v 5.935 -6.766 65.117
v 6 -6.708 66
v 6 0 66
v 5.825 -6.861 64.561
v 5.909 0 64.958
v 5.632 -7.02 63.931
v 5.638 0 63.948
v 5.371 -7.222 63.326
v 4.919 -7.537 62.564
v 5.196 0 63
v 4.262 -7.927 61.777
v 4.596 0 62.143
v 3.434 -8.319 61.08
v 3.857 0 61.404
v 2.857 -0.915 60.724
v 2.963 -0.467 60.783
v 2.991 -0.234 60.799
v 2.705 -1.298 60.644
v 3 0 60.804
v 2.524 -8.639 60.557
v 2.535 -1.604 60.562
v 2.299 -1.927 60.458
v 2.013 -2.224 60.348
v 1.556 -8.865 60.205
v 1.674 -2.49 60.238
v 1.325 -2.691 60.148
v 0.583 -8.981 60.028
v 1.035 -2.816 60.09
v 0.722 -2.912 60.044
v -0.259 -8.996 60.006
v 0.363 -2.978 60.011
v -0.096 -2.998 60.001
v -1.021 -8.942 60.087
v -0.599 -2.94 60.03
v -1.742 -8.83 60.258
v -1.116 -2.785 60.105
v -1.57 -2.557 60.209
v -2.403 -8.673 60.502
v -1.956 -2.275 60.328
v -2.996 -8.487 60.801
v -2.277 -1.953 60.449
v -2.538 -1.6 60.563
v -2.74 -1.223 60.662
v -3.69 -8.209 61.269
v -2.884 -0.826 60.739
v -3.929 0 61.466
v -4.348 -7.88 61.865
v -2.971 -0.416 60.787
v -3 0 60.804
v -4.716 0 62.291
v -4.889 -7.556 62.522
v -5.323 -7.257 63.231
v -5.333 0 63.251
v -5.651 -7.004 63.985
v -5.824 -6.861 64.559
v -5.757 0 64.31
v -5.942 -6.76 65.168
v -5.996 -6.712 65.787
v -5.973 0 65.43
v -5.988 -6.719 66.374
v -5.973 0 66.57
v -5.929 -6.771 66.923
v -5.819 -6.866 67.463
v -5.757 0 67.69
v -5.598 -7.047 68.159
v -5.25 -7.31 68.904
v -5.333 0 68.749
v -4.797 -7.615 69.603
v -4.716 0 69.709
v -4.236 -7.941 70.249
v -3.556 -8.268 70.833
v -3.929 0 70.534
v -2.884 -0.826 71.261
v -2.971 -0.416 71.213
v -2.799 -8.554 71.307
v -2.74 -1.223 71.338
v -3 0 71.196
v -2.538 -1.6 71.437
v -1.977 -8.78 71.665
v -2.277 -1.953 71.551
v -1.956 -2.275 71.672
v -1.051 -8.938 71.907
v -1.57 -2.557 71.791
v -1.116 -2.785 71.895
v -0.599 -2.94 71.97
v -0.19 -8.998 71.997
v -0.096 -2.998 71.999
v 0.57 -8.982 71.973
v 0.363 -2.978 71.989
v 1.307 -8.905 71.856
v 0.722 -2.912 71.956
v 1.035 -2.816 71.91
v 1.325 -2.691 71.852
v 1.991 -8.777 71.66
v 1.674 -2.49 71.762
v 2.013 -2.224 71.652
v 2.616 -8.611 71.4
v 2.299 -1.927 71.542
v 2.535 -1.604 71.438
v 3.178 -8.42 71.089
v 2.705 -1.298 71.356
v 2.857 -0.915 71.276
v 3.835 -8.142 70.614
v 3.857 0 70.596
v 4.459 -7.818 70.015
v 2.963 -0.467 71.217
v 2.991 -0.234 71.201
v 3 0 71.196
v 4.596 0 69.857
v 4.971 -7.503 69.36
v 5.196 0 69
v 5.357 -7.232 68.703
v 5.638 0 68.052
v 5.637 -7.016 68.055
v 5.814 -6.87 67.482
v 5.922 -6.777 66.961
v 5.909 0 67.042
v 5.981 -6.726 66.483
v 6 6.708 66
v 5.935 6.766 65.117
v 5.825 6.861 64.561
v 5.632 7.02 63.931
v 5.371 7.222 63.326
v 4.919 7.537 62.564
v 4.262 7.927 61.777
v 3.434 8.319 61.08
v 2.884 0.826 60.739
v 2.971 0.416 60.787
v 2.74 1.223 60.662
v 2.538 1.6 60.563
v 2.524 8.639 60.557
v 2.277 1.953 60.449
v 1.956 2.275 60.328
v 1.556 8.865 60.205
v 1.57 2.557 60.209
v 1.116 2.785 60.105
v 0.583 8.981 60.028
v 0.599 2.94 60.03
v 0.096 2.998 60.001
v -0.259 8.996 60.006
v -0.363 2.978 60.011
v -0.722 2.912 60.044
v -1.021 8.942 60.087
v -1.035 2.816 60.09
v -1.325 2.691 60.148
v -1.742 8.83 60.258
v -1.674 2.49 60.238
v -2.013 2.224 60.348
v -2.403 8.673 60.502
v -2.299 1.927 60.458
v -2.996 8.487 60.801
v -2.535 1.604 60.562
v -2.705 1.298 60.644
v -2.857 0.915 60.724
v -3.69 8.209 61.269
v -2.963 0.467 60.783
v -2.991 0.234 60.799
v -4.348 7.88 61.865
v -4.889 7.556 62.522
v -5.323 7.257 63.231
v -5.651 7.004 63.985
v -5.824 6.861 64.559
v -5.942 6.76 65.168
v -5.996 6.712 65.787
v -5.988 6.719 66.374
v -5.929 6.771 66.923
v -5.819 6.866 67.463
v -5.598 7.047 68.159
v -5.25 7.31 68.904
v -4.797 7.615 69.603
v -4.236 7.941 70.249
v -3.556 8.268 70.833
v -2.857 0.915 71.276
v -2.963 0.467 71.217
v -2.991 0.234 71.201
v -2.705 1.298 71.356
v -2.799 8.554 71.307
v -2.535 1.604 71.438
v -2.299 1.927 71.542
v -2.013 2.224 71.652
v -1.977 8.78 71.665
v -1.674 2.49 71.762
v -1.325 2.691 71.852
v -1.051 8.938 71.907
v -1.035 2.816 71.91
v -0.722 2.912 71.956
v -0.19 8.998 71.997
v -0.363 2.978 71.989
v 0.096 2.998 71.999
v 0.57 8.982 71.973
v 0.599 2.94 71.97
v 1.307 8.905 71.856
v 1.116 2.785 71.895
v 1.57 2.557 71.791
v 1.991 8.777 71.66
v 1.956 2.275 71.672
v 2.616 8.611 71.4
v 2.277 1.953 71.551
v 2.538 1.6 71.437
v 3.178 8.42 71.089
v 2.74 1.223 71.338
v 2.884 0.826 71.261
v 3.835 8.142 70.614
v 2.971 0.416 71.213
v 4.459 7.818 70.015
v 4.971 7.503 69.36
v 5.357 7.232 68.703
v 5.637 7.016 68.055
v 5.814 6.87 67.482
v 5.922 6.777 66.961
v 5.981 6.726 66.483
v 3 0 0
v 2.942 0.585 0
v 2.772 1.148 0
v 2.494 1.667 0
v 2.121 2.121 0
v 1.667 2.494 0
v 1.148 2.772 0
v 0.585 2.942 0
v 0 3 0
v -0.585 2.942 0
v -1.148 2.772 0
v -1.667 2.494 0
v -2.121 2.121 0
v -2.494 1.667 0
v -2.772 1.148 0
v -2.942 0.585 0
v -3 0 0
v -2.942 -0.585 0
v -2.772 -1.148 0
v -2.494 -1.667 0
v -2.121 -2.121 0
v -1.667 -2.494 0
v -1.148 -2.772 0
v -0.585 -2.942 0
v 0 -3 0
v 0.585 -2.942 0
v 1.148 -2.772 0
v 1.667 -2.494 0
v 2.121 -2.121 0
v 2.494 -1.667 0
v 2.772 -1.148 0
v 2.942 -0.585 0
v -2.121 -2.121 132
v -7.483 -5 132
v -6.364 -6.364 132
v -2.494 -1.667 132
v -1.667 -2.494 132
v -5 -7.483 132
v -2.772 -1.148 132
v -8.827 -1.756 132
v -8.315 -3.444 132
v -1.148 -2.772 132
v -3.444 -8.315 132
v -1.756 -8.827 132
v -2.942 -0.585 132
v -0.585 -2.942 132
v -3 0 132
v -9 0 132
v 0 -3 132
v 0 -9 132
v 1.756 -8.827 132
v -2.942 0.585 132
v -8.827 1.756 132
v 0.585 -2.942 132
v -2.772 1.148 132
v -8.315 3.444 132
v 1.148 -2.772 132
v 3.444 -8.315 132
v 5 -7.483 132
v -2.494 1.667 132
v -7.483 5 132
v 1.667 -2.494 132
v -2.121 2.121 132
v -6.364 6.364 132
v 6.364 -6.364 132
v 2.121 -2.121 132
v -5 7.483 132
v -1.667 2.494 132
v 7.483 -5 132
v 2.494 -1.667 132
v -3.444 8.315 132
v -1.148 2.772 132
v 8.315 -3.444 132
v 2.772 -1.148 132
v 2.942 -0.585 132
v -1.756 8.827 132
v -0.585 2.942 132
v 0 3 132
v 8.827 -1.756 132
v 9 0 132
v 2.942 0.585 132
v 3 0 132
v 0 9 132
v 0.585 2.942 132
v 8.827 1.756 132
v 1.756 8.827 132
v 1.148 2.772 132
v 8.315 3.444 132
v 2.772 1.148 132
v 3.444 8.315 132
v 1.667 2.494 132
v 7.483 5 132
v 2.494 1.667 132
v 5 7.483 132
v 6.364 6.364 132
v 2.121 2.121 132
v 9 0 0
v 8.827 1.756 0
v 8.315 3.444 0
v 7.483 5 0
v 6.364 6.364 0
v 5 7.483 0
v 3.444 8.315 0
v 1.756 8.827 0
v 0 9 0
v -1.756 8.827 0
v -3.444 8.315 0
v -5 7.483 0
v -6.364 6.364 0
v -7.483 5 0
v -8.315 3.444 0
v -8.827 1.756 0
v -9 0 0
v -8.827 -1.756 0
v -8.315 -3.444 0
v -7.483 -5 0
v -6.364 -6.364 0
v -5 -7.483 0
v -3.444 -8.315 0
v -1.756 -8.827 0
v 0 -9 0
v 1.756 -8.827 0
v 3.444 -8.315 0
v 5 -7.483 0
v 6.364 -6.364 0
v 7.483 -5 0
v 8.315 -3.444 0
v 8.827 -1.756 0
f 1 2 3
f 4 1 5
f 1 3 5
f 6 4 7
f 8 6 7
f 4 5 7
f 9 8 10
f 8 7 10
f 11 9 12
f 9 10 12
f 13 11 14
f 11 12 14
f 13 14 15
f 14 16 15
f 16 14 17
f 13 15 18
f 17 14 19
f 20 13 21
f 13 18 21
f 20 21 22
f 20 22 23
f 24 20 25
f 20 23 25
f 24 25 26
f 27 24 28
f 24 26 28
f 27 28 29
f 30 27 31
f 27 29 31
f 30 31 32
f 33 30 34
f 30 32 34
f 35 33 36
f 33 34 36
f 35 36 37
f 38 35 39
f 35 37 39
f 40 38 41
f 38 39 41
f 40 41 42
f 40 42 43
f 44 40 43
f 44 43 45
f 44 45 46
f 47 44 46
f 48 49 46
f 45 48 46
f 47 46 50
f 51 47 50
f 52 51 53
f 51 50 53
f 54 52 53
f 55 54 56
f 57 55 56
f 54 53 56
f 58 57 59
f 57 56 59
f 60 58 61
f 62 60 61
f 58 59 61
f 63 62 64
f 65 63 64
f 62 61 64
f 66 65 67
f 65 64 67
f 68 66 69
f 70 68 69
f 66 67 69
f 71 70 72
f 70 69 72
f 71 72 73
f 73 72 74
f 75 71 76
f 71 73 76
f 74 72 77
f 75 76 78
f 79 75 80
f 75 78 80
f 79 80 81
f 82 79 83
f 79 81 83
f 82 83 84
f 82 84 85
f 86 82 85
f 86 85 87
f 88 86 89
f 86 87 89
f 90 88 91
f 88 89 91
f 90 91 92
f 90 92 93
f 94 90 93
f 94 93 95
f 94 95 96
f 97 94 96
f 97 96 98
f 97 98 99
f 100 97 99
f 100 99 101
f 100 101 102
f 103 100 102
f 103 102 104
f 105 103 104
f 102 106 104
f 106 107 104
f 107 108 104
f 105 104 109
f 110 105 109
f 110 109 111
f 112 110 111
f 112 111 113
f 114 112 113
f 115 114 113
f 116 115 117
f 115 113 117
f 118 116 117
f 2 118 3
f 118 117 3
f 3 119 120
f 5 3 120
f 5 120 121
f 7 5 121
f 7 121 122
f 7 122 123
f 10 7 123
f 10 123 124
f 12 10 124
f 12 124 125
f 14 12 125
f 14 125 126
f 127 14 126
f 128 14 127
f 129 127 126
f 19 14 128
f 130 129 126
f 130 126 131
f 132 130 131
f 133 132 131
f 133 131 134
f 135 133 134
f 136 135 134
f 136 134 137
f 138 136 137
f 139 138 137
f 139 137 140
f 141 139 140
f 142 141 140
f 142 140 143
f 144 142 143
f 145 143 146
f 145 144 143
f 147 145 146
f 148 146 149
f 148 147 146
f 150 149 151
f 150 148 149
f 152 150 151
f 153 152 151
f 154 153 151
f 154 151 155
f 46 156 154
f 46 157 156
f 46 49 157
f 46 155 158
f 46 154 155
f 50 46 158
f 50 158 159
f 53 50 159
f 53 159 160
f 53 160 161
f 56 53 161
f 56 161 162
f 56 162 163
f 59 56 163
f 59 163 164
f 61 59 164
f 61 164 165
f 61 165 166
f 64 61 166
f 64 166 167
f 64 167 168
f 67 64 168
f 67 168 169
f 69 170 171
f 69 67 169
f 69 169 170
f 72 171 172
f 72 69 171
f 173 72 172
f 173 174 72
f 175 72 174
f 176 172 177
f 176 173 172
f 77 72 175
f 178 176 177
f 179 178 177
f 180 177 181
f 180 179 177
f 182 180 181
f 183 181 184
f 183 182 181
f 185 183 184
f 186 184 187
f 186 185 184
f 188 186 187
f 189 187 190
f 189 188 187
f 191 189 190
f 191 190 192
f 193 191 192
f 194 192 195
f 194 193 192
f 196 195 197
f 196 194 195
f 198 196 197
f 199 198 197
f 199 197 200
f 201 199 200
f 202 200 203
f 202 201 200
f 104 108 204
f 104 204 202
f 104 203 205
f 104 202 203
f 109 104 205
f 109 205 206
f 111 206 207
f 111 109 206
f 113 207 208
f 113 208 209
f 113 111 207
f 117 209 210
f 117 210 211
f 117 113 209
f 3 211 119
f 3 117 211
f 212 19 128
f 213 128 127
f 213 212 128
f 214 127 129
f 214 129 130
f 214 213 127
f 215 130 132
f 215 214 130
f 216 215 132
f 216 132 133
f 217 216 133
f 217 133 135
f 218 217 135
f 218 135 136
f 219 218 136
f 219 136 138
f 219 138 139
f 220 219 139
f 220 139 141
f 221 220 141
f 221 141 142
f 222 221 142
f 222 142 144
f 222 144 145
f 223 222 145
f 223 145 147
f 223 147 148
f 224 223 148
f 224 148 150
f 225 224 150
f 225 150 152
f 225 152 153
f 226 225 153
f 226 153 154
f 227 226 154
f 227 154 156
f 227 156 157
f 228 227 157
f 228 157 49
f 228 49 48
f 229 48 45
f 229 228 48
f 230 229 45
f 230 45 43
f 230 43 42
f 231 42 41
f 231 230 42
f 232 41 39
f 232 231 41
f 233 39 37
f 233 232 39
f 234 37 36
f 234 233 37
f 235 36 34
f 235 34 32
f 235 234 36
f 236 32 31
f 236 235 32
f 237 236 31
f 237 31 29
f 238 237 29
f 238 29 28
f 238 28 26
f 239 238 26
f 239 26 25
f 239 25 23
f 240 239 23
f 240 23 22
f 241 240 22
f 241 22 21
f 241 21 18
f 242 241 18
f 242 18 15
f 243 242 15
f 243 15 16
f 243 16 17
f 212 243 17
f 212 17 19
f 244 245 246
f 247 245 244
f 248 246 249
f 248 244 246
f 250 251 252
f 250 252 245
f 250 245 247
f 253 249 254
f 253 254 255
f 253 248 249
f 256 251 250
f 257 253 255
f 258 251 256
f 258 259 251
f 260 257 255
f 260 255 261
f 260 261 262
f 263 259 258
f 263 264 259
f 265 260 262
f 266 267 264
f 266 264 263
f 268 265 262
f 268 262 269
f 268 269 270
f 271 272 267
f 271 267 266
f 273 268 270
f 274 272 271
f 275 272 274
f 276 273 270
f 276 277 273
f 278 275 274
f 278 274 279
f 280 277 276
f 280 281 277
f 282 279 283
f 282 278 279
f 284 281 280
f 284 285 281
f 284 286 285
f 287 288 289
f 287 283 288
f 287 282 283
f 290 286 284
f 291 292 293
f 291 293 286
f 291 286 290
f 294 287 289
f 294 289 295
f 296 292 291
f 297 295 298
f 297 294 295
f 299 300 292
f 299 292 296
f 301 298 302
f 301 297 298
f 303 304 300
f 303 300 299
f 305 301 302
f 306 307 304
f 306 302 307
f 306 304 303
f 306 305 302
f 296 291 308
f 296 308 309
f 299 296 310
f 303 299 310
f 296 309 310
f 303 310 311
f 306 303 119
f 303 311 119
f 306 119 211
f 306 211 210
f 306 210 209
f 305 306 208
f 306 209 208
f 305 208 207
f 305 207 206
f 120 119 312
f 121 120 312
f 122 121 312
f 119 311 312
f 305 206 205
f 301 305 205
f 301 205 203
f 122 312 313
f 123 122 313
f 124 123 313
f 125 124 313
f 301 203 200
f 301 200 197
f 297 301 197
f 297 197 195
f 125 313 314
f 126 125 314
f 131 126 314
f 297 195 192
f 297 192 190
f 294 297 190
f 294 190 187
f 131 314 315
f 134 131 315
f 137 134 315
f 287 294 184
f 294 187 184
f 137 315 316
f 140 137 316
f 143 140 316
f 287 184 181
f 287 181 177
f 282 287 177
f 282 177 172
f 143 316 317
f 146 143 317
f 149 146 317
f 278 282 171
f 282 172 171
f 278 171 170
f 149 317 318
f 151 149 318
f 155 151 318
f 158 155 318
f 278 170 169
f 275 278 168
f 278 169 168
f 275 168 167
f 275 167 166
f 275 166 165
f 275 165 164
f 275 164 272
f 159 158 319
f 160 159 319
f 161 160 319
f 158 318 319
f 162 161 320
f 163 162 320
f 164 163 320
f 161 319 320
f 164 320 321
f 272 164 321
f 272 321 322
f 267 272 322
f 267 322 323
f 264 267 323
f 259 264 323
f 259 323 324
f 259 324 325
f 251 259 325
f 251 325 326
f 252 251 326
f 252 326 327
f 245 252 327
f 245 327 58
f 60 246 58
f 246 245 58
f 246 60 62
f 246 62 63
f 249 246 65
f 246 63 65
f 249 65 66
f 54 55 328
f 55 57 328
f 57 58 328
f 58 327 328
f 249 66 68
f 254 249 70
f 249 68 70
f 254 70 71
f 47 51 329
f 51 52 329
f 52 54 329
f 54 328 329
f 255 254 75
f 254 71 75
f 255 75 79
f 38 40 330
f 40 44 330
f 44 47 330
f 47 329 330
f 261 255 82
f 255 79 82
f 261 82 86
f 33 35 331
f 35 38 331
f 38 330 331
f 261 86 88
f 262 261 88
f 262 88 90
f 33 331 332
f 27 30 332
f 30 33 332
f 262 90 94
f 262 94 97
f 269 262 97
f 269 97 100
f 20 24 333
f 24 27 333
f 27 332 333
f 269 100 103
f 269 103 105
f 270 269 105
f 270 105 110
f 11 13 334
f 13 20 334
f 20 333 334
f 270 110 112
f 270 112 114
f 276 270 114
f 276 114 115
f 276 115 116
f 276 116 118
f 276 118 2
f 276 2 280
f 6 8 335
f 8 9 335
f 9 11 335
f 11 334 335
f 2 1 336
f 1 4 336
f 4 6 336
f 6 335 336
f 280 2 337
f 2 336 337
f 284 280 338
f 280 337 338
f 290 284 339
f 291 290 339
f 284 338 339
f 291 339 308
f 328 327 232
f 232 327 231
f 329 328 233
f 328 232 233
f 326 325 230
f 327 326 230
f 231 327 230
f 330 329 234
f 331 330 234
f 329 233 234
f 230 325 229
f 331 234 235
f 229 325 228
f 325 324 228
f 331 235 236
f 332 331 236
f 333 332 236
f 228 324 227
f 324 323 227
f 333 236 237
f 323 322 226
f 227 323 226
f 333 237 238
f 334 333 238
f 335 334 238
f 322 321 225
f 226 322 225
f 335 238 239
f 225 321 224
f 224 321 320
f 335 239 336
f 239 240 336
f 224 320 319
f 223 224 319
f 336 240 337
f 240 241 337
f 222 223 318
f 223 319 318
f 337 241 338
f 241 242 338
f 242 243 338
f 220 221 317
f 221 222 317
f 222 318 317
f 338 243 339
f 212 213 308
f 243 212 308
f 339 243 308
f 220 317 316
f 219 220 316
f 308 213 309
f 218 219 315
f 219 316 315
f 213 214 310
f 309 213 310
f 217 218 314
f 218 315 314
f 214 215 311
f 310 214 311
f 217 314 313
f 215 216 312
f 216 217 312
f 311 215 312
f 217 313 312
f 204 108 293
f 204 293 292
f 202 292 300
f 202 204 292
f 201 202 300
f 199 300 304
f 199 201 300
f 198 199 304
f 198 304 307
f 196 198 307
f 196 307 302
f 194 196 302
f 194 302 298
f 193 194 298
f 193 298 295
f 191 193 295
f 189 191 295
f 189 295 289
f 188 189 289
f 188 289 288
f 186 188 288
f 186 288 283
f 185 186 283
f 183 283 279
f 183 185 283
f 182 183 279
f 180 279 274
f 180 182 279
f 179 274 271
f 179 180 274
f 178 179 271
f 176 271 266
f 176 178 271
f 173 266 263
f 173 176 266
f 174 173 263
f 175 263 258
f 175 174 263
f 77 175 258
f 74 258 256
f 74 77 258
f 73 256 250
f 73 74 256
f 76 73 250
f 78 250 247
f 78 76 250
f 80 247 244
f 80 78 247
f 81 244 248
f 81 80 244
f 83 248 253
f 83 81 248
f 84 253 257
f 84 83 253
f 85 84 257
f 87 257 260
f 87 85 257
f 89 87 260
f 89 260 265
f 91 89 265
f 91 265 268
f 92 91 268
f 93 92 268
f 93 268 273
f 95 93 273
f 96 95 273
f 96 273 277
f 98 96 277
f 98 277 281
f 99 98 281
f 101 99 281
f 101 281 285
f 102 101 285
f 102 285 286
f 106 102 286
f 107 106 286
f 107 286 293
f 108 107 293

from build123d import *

# Parameters (mm, degrees)
SKETCH1_R               = 9
SKETCH1_R_2             = 3
BOSS_EXTRUDE1_DEPTH     = 132
SKETCH2_R               = 6
CUT_EXTRUDE1_DEPTH      = 10
CUT_EXTRUDE1_DEPTH_BACK = 10


with BuildPart() as part:
    # Sketch1 → Boss-Extrude1 (new body)
    with BuildSketch(Plane.XY):
        Circle(SKETCH1_R)
        Circle(SKETCH1_R_2, mode=Mode.SUBTRACT)
    extrude(amount=BOSS_EXTRUDE1_DEPTH)

    # Sketch2 → Cut-Extrude1 (cut, two sides)
    with BuildSketch(Plane(origin=(0, 0, 0), x_dir=(1, 0, 0), z_dir=(0, 1, 0))) as cut_extrude1_sk:
        with Locations((0, -66)):
            Circle(SKETCH2_R)
    extrude(amount=CUT_EXTRUDE1_DEPTH, mode=Mode.SUBTRACT)
    extrude(cut_extrude1_sk.sketch, amount=-CUT_EXTRUDE1_DEPTH_BACK, mode=Mode.SUBTRACT)


solid = part.part
